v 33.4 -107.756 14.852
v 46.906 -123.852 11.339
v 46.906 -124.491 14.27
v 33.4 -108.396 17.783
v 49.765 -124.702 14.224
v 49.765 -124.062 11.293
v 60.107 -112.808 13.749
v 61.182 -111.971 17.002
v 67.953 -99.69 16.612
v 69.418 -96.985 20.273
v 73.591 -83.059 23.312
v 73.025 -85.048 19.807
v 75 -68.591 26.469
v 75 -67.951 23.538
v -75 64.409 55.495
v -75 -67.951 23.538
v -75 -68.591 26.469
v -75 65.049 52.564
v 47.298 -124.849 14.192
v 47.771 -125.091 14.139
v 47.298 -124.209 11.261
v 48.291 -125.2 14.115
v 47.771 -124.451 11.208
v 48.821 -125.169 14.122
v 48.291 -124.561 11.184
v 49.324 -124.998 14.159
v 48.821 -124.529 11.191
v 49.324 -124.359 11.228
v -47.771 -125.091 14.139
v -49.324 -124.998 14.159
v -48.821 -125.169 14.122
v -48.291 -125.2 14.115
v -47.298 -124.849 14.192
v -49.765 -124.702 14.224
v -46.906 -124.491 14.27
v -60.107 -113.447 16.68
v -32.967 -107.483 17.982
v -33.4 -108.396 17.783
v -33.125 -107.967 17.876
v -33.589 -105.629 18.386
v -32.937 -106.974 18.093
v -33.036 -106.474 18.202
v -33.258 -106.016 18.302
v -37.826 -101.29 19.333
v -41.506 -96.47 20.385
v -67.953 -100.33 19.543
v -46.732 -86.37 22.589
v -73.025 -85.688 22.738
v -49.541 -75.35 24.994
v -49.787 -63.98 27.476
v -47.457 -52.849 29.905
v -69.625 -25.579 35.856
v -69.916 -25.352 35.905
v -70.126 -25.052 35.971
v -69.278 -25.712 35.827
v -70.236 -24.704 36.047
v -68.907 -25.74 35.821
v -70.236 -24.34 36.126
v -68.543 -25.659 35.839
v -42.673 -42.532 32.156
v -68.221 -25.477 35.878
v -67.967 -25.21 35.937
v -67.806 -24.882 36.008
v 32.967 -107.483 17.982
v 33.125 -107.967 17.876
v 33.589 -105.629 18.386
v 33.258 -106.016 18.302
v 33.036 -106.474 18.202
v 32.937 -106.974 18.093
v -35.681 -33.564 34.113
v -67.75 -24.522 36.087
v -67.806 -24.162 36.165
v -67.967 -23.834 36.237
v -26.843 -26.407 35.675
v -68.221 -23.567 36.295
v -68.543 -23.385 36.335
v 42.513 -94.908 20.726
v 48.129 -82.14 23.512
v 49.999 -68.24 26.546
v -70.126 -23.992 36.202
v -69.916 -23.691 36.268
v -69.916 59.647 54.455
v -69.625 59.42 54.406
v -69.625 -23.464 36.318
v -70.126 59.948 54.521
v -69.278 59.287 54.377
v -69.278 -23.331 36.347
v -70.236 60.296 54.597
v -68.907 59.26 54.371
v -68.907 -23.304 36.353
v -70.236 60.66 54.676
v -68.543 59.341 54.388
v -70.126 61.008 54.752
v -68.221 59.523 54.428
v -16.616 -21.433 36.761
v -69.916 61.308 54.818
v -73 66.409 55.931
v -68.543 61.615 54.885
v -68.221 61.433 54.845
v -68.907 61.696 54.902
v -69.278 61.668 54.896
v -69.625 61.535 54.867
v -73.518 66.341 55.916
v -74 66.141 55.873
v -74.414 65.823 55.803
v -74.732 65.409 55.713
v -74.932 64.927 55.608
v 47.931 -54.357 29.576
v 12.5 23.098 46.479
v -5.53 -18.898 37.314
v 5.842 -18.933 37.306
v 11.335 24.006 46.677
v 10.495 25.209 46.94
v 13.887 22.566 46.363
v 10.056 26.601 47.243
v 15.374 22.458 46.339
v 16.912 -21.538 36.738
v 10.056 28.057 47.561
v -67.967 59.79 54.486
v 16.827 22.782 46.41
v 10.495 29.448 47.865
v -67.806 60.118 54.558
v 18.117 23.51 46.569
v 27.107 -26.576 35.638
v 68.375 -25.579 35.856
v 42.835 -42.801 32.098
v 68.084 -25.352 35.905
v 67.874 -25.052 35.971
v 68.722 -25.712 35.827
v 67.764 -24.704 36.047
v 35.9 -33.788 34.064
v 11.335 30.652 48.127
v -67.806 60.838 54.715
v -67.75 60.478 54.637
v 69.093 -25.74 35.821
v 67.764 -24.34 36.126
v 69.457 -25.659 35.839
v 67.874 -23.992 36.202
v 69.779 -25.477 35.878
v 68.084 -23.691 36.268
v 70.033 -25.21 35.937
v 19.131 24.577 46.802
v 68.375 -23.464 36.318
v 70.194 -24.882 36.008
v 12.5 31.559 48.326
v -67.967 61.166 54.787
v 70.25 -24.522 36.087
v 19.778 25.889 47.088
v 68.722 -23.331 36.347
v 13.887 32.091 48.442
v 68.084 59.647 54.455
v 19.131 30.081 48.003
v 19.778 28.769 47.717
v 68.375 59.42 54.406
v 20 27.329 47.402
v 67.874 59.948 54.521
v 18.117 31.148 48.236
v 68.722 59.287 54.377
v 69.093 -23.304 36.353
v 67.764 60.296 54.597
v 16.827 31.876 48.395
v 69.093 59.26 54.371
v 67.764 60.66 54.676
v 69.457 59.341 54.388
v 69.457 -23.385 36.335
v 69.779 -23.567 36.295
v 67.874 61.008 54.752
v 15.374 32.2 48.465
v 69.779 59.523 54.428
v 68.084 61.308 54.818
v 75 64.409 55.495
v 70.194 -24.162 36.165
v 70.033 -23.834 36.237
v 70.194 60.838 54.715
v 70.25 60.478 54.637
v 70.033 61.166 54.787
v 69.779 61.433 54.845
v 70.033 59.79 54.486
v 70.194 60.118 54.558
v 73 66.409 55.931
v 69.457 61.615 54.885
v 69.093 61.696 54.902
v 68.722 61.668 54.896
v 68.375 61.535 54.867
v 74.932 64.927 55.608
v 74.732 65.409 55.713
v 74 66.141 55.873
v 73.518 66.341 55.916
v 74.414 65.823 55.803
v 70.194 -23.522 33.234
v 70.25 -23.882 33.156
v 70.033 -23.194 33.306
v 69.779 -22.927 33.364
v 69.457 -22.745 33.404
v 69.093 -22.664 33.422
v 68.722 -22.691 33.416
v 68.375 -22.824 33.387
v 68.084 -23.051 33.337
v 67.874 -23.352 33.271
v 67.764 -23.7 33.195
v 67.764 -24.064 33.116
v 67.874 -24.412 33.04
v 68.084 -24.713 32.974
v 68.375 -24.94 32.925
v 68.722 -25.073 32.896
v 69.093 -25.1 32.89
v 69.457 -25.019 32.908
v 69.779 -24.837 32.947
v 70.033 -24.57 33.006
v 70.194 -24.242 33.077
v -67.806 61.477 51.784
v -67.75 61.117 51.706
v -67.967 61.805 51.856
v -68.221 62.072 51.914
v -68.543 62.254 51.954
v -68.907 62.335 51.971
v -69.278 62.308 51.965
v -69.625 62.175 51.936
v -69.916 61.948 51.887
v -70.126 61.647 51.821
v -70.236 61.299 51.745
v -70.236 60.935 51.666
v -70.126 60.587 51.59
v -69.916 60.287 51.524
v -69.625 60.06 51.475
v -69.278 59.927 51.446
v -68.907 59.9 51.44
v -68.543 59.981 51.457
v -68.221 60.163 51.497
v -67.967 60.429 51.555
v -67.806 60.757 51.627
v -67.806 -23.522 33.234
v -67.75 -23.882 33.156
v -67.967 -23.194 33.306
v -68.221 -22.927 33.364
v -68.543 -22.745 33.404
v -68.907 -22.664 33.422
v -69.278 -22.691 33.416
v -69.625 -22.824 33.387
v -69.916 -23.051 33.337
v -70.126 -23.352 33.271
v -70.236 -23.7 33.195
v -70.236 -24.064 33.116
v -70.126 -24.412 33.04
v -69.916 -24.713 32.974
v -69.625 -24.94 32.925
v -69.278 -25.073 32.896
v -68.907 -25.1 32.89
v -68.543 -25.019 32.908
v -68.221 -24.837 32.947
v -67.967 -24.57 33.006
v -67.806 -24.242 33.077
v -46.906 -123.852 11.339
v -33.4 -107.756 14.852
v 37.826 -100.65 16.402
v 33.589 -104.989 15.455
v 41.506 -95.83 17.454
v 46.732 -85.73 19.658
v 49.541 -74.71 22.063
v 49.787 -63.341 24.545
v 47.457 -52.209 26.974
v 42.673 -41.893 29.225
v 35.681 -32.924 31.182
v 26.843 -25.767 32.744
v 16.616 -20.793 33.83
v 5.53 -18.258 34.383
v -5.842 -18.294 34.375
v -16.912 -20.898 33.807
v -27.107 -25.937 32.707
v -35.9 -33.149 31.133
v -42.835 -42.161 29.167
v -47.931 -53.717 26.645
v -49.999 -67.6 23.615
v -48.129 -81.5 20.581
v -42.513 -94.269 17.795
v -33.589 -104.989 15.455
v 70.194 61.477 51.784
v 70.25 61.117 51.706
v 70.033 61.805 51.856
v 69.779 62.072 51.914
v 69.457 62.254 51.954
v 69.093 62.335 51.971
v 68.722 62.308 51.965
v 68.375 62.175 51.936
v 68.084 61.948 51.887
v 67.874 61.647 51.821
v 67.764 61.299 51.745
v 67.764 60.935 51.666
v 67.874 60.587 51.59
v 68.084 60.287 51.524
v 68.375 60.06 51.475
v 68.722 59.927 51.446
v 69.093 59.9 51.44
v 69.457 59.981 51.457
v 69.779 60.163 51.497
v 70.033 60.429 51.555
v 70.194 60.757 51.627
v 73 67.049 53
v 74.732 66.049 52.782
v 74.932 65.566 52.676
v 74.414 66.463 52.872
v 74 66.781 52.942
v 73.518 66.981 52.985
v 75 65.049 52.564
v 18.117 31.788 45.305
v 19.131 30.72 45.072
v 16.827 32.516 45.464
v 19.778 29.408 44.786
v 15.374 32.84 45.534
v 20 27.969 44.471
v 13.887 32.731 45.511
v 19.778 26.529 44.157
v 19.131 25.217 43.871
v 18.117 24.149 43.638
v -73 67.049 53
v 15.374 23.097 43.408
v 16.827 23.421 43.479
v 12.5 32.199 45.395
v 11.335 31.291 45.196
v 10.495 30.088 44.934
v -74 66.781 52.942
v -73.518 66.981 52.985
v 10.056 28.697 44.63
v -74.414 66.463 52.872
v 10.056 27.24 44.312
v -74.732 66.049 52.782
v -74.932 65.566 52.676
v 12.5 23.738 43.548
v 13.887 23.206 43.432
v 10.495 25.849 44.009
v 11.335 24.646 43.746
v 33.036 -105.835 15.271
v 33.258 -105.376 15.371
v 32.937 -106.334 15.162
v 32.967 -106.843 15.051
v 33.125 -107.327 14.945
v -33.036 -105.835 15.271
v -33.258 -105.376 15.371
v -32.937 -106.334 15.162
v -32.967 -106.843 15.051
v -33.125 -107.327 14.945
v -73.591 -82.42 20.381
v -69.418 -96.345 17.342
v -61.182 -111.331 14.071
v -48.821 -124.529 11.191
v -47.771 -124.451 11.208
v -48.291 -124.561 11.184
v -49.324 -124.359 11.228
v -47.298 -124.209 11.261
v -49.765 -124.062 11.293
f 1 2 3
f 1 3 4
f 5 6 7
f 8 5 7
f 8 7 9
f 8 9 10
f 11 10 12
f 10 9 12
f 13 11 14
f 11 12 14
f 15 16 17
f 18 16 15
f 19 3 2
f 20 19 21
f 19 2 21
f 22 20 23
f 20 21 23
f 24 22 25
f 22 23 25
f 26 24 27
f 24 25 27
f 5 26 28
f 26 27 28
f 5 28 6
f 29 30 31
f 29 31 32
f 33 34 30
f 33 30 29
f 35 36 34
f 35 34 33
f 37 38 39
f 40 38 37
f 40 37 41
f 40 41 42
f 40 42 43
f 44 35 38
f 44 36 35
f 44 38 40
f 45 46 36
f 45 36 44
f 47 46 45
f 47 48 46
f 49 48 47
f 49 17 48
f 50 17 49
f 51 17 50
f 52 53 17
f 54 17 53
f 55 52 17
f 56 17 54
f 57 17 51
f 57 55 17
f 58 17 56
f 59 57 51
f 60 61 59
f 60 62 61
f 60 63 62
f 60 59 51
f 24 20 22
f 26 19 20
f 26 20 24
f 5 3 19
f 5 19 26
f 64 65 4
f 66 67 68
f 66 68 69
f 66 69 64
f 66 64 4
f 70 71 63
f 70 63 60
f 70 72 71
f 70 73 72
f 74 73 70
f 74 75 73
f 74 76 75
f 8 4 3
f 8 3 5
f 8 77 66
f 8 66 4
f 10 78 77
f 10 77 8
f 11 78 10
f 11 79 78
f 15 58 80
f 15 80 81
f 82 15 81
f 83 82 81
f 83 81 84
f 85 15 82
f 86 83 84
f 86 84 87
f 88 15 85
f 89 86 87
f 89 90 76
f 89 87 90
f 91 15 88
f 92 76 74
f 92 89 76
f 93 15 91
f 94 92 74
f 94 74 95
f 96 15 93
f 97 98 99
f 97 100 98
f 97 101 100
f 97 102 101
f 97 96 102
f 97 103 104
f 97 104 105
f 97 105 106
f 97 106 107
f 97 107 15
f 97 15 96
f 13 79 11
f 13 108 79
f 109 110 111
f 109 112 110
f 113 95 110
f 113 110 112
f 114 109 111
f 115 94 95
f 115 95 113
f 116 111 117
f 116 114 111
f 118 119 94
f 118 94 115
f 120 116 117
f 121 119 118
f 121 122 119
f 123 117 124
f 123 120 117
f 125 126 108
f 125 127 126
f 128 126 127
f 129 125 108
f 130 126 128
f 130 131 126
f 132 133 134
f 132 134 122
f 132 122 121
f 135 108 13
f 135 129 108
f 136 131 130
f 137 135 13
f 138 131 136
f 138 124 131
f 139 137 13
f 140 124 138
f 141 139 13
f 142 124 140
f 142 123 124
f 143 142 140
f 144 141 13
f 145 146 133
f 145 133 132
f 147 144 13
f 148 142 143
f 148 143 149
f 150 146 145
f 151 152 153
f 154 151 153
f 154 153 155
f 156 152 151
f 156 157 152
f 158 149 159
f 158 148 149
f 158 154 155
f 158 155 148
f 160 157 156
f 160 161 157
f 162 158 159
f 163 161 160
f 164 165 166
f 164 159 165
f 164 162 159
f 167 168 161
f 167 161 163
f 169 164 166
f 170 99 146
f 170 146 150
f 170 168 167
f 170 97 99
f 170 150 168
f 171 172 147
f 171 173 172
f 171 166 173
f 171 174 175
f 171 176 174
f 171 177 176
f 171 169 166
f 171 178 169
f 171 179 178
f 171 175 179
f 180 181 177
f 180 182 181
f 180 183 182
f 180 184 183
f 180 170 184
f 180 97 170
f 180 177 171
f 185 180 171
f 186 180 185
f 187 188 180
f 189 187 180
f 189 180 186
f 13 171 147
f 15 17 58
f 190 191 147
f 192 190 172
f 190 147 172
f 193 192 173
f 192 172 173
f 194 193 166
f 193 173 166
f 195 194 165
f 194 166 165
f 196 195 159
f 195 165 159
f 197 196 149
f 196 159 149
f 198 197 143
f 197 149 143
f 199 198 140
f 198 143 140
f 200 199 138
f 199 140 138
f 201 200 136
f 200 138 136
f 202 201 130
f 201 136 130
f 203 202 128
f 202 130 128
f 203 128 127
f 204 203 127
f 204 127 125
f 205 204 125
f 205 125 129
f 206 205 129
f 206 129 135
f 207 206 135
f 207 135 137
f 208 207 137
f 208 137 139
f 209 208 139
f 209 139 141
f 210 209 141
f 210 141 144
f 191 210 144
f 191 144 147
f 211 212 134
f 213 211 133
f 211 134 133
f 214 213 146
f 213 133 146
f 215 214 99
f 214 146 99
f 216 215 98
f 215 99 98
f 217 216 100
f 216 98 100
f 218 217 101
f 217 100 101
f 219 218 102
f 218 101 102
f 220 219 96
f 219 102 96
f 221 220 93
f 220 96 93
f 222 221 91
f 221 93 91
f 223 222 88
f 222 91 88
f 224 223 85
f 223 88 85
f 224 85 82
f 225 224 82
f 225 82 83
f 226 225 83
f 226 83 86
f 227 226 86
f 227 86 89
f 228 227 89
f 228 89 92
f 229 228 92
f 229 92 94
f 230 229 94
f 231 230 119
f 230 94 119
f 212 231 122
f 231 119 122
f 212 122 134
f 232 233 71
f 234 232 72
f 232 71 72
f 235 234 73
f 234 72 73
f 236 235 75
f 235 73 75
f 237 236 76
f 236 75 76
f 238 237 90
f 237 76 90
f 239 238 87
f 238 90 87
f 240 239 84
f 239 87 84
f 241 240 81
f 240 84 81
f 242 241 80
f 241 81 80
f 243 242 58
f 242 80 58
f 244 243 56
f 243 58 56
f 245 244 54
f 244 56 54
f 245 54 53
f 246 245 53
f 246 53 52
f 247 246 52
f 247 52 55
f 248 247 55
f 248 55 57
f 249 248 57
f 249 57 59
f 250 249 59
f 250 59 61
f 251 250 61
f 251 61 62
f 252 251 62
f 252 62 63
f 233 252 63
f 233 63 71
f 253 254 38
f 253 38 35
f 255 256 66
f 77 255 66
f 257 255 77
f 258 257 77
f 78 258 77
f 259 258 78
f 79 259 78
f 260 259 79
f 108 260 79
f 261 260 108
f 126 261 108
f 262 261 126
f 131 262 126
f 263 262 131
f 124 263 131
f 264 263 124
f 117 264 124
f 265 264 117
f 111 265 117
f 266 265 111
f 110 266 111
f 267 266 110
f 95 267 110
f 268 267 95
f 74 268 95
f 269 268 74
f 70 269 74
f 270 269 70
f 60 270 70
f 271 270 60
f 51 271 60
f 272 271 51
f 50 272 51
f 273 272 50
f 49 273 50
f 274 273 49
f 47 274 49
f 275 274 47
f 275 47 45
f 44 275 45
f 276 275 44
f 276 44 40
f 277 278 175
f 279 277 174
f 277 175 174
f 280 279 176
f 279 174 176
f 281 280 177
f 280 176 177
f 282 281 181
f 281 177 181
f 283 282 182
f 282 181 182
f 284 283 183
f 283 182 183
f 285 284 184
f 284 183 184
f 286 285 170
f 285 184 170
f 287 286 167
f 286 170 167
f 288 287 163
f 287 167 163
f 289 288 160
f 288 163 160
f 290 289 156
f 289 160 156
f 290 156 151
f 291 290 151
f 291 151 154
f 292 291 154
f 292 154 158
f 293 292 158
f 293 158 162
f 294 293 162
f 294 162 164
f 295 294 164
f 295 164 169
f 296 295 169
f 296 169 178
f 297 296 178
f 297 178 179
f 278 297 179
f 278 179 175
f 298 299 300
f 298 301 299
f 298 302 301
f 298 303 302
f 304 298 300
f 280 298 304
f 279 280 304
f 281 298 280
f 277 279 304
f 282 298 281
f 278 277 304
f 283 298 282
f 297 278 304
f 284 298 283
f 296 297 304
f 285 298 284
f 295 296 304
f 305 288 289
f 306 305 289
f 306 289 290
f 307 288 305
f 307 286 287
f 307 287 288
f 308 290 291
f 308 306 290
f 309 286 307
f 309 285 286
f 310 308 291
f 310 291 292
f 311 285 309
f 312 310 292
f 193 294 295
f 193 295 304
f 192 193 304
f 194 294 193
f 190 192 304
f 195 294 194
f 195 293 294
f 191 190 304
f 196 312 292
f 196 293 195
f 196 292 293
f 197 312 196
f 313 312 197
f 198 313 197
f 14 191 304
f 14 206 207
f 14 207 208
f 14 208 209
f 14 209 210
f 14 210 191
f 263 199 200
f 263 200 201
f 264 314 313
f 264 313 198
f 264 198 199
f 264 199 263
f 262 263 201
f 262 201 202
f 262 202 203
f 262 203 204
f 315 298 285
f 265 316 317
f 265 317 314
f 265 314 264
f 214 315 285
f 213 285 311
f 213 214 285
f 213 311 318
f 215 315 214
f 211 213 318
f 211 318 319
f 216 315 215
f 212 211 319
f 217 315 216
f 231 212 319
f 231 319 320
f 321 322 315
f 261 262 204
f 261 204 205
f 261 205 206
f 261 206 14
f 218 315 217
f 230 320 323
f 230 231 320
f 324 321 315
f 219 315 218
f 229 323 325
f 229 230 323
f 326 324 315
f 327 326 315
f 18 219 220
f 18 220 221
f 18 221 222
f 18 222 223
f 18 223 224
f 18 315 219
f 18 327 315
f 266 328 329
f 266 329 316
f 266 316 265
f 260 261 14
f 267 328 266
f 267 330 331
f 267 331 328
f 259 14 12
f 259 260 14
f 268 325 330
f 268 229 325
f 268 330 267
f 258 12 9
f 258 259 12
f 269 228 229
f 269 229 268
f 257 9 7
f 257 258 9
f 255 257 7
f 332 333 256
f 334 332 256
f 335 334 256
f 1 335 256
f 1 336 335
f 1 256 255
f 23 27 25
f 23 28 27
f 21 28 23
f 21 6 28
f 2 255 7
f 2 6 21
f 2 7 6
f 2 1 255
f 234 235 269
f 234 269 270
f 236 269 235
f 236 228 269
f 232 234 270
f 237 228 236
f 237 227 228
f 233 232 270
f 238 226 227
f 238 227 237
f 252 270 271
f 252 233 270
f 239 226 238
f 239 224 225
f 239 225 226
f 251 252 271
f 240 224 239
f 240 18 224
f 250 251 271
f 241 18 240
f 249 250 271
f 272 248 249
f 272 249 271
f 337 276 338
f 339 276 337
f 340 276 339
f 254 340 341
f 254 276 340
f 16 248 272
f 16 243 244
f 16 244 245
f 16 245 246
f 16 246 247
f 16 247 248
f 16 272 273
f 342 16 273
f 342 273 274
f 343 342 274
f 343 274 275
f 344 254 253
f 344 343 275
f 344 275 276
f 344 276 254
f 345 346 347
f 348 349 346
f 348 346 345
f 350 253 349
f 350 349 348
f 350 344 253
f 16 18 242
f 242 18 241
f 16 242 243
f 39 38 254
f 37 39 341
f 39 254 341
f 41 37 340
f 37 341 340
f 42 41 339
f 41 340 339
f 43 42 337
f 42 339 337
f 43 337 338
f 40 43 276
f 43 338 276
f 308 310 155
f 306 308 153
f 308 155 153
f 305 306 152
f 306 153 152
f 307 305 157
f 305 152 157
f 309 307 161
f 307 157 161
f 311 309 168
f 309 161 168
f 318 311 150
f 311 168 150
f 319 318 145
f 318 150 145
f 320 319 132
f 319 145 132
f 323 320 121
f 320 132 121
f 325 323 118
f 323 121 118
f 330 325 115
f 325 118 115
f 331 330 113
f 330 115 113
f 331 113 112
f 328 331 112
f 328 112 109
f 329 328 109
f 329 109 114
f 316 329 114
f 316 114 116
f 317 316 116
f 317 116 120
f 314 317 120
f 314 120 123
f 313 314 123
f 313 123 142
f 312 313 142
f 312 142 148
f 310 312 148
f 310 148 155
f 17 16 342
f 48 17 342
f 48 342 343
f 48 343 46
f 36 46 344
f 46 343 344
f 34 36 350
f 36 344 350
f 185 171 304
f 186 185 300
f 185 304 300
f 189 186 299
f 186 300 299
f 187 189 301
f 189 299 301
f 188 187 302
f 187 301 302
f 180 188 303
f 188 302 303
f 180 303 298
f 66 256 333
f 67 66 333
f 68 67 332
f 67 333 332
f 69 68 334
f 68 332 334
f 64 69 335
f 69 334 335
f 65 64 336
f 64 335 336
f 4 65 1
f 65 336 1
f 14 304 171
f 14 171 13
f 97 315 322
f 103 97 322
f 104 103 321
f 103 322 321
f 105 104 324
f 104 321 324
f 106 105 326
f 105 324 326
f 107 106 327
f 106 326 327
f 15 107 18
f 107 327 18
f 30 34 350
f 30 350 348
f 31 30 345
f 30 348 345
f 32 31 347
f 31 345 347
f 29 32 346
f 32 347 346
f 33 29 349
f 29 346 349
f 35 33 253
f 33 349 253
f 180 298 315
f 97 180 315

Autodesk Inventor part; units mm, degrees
ref_plane "YZ Plane" through (0, 0, 0) normal (1, 0, 0) x (0, 1, 0)
ref_plane "XZ Plane" through (0, 0, 0) normal (0, 1, 0) x (-1, 0, 0)
sketch "Sketch1" plane through (0, 0, 0) normal (0, 0, 1) x (1, 0, 0)
  line L0 (-75, 67.0488) -> (75, 67.0488)
  arc A0 (-75, -67.9512) -> (-48.2091, -125.4046) centre (0, -67.9512) ccw
  arc A1 (48.2091, -125.4046) -> (75, -67.9512) centre (0, -67.9512) ccw
  arc A2 (32.1394, -106.2534) -> (-32.1394, -106.2534) centre (0, -67.9512) ccw
  line L1 (-48.2091, -125.4046) -> (-32.1394, -106.2534) construction
  line L2 (-32.1394, -106.2534) -> (0, -67.9512) construction
  line L3 (-48.2091, -125.4046) -> (-32.1394, -106.2534) construction
  line L4 (75, -67.9512) -> (75, 67.0488)
  line L5 (-75, -67.9512) -> (-75, 67.0488)
  line L6 (0, -67.9512) -> (0, -148.7803) construction
  line L7 (-32.1394, -106.2534) -> (-48.2091, -125.4046)
  line L8 (48.2091, -125.4046) -> (32.1394, -106.2534)
  point P0 (0, 0)
  dimension "d0" = 150
  dimension "d2" = 135
  dimension "d3" = 135
  dimension "d7" = 135
  dimension "d8" = 50
  dimension "d19" = 75
  dimension "d25" = 75
  dimension "d26" = 0
  dimension "d29" = 50
  dimension "d31" = 50
  dimension "d34" = 40
  dimension "d35" = 40
extrude "Extrusion1" add sketch "Sketch1" along normal blind 3
sketch "Sketch5" plane through (0, 0, 3) normal (0, 0, 1) x (1, 0, 0)
  arc A0 (32.1394, -106.2534) -> (-32.1394, -106.2534) centre (0, -67.9512) ccw projected
  line L0 (32.1394, -106.2534) -> (48.2091, -125.4046) projected
  line L1 (-48.2091, -125.4046) -> (-32.1394, -106.2534) projected
  arc A1 (37.2817, -112.3818) -> (-37.2817, -112.3818) centre (0, -67.9512) ccw
  arc A2 (32.1394, -106.2534) -> (-32.1394, -106.2534) centre (0, -67.9512) ccw projected
  arc A3 (32.1394, -106.2534) -> (-32.1394, -106.2534) centre (0, -67.9512) ccw
  arc A4 (41.7812, -117.7441) -> (-41.7812, -117.7441) centre (0, -67.9512) ccw
  arc A5 (46.2807, -123.1064) -> (-46.2807, -123.1064) centre (0, -67.9512) ccw
  line L2 (-46.2807, -123.1064) -> (-41.7812, -117.7441)
  line L3 (-37.2817, -112.3818) -> (-32.1394, -106.2534)
  line L4 (32.1394, -106.2534) -> (37.2817, -112.3818)
  line L5 (41.7812, -117.7441) -> (46.2807, -123.1064)
  point P0 (0, 0)
  dimension "d49" = 58
  dimension "d52" = 65
  dimension "d53" = 72
extrude "Extrusion3" add sketch "Sketch5" along normal blind 8 contours A0 L1 A1 L0 | A4 L1 A5 L0
sketch "Sketch7" plane through (-48.2091, -125.4046, 3) normal (0.7660444, -0.6427876, 0) x (0, 0, -1)
  line L0 (0, 10) -> (-8, 10) projected
  line L1 (-4.5, 10) -> (0, 10)
  line L2 (0, 10) -> (0, 17) projected
  line L3 (0, 10) -> (0, 17)
  line L4 (0, 17) -> (-4.5, 17)
  line L5 (0, 17) -> (-8, 17) projected
  arc A0 (-4.5, 10) -> (-4.5, 17) centre (-4.5, 13.5) ccw
  line L6 (-19.076, 75) -> (19.2246, 75) construction
  point P0 (3, 127.0537)
  dimension "d58" = 4.5
  dimension "d59" = 0
  dimension "d60" = 0
  dimension "d61" = 3.5
  dimension "d62" = 58
revolve "Revolution1" add sketch "Sketch7" angle 280 about axis through (0, -67.9512, 22.076) along (0, 0, -1)
sketch "Sketch18" plane through (0, 0, 0) normal (0, 0, -1) x (-1, 0, 0)
  arc A0 (32.1394, -106.2534) -> (-32.1394, -106.2534) centre (0, -67.9512) ccw projected
  line L0 (32.1394, -106.2534) -> (48.2091, -125.4046) projected
  arc A1 (32.1394, -106.2534) -> (-32.1394, -106.2534) centre (0, -67.9512) ccw
  line L1 (-32.1394, -106.2534) -> (-47.5756, -125.4046)
  line L2 (32.1394, -106.2534) -> (48.2091, -125.4046)
  line L3 (75, 67.0488) -> (-75, 67.0488) projected
  line L4 (-75, 67.0488) -> (-75, -67.9512) projected
  arc A2 (-75, -67.9512) -> (-48.2091, -125.4046) centre (0, -67.9512) ccw projected
  line L5 (-48.2091, -125.4046) -> (-32.1394, -106.2534) projected
  arc A3 (32.1394, -106.2534) -> (-32.1394, -106.2534) centre (0, -67.9512) ccw projected
  line L6 (32.1394, -106.2534) -> (48.2091, -125.4046) projected
  arc A4 (48.2091, -125.4046) -> (75, -67.9512) centre (0, -67.9512) ccw projected
  line L7 (75, -67.9512) -> (75, 67.0488) projected
  arc A5 (-75, -67.9512) -> (-48.2091, -125.4046) centre (0, -67.9512) ccw projected
  line L8 (-75, -67.9512) -> (-75, 67.0488)
  line L9 (75, -67.9512) -> (75, 67.0488) projected
  line L10 (75, 67.0488) -> (75, -67.9512)
  arc A6 (-75, -67.9512) -> (-48.2091, -125.4046) centre (0, -67.9512) ccw
  arc A7 (48.2091, -125.4046) -> (75, -67.9512) centre (0, -67.9512) ccw projected
  arc A8 (48.2091, -125.4046) -> (75, -67.9512) centre (0, -67.9512) ccw
  arc A9 (35.4639, -107.3379) -> (-35.4639, -107.3379) centre (0, -67.9512) ccw
  line L11 (0, -67.9512) -> (35.4639, -107.3379) construction
  line L12 (0, -67.9512) -> (-35.4639, -107.3379) construction
  line L13 (0, -67.9512) -> (0, -163.7516) construction
  arc A10 (46.2807, -123.1064) -> (-46.2807, -123.1064) centre (0, -67.9512) ccw construction
  line L14 (72, -67.9512) -> (72, 64.0488)
  line L15 (72, 64.0488) -> (-72, 64.0488)
  line L16 (-72, 64.0488) -> (-72, -67.9512)
  arc A11 (-72, -67.9512) -> (-48.1774, -121.4576) centre (0, -67.9512) ccw
  arc A12 (48.1774, -121.4576) -> (72, -67.9512) centre (0, -67.9512) ccw
  line L17 (-48.1774, -121.4576) -> (-35.4639, -107.3379)
  line L18 (35.4639, -107.3379) -> (48.1774, -121.4576)
  point P0 (0, 0)
  dimension "d99" = 84
  dimension "d100" = 42
  dimension "d101" = 53
  dimension "d102" = 3
  dimension "d103" = 3
extrude "Extrusion8" add sketch "Sketch18" against normal blind 53
sketch "Sketch19" plane through (75, -67.9512, 0) normal (1, 0, 0) x (0, 0, -1)
  line L0 (-3, 132) -> (-3, 0) projected
  line L1 (-3, 0) -> (-3, 0) projected
  line L2 (-3, 0) -> (-3, 132) projected
  line L3 (-11, 0) -> (-11, -53.5064) projected
  line L4 (-53, 0) -> (-53, 135) projected
  line L5 (-53, 0) -> (-53, -57.4533) projected
  line L6 (0, -57.4533) -> (-53, -57.4533) projected
  line L7 (-53, 135) -> (-53, -57.4533)
  line L8 (-53, -57.4533) -> (-11, -57.4533)
  line L9 (0, 135) -> (-53, 135) projected
  line L10 (-11, -57.4533) -> (-53, 135)
  point P0 (0, 67.9512)
  dimension "d106" = 0
extrude "Extrusion9" cut sketch "Sketch19" against normal blind 150
sketch "Sketch20" plane through (-32.1394, -106.2534, 15.1794) normal (0.7660444, -0.6427876, 0) x (0, 0, -1)
  ellipse E0 centre (7.6794, -11.4625) end of major axis (11.1794, -11.4625) minor radius 3.4979 (7.6794, -14.9604) -> (7.6794, -7.9647) ccw projected
  circle A0 centre (7.6794, -11.4625) radius 3.5
  line L0 (-25.5689, 50.0375) -> (41.9904, 50.0375) construction
  point P0 (15.1794, 102.0537)
  dimension "d109" = 61.5
revolve "Revolution4" cut sketch "Sketch20" angle 2 about axis through (0.0241, -67.9225, 40.7483) along (0, 0, -1)
mirror "Mirror3" about plane through (0, 0, 0) normal (1, 0, 0) of "Revolution4"
fillet "Fillet1" radius 2 12 edges at (75, 67.0488, 26.5) (-48.2091, -125.4046, 5.5) (-32.1394, -106.2534, 7.5897) (48.2091, -125.4046, 5.5) (32.1394, -106.2534, 7.5897) (-75, 67.0488, 26.5) (0, 67.0488, 0) (-67.9731, -99.6476, 0) (-75, -0.4512, 0) (67.9731, -99.6476, 0) (75, -0.4512, 0) (0, -17.9512, 0)
sketch "Sketch23" plane through (0, 0, 0) normal (0, 0, -1) x (-1, 0, 0)
  arc A0 (43.4935, -116.2556) -> (-43.4935, -116.2556) centre (0, -67.9512) ccw projected
  line L0 (0, -67.9512) -> (0, -128.8082) construction
  arc A1 (43.4935, -116.2556) -> (-43.4935, -116.2556) centre (0, -67.9512) ccw projected
  line L1 (-56.2917, -100.4512) -> (-50.2295, -96.9512) construction
  line L2 (0, -67.9512) -> (-50.2295, -96.9512) construction
  line L3 (-56.2917, -100.4512) -> (0, -67.9512) construction
  circle A2 centre (-55.0106, -95.6701) radius 3.5 construction
  line L4 (-59.6154, -93.8549) -> (-53.1953, -91.0653) construction
  arc A3 (38.8096, -111.0536) -> (-38.8096, -111.0536) centre (0, -67.9512) ccw construction
  arc A4 (-62.3186, -49.4745) -> (-59.6154, -93.8549) centre (0, -67.9512) ccw construction
  line L5 (0, -67.9512) -> (-62.3186, -49.4745) construction
  line L6 (0, -67.9512) -> (-59.6154, -93.8549) construction
  arc A5 (35.4639, -107.3379) -> (-35.4639, -107.3379) centre (0, -67.9512) ccw construction
  arc A6 (-55.6074, -51.4643) -> (-53.1953, -91.0653) centre (0, -67.9512) ccw construction
  line L7 (0, -67.9512) -> (-55.6074, -51.4643) construction
  line L8 (0, -67.9512) -> (-53.1953, -91.0653) construction
  line L9 (-62.3186, -49.4745) -> (-55.6074, -51.4643)
  arc A7 (-62.3186, -49.4745) -> (-56.2917, -100.4512) centre (0, -67.9512) ccw
  arc A8 (-55.6074, -51.4643) -> (-50.2295, -96.9512) centre (0, -67.9512) ccw
  line L10 (-56.2917, -100.4512) -> (-50.2295, -96.9512)
  point P0 (0, 0)
  dimension "d113" = 7
  dimension "d114" = 60
  dimension "d115" = 7
  dimension "d116" = 7
  dimension "d117" = 40
  dimension "d118" = 40
extrude "Extrusion10" cut sketch "Sketch23" against normal up to next
sketch "Sketch24" plane through (-73, 67.0488, 53) normal (0, -0.2132164, 0.977005) x (1, 0, 0)
  line L0 (146, 0) -> (0, 0) projected
  ellipse E0 centre (0, -2.0471) end of major axis (0, 0) minor radius 2 (0, 0) -> (-2, -2.0471) ccw projected
  line L1 (-2, -138.1774) -> (-2, -2.0471) projected
  ellipse E1 centre (73, -138.1774) end of major axis (73, -61.4122) minor radius 75 (-2, -138.1774) -> (23.235, -195.609) ccw projected
  ellipse E2 centre (24.562, -194.0775) end of major axis (24.562, -196.1246) minor radius 2 (23.235, -195.609) -> (26.0941, -195.3933) ccw projected
  line L2 (39.5998, -178.9191) -> (26.0941, -195.3933) projected
  ellipse E3 centre (38.0677, -177.6032) end of major axis (38.0677, -175.5562) minor radius 2 (39.5998, -178.9191) -> (39.4112, -176.0869) ccw projected
  ellipse E4 centre (73, -138.1774) end of major axis (73, -189.3542) minor radius 50 (106.5888, -176.0869) -> (39.4112, -176.0869) ccw projected
  ellipse E5 centre (107.9323, -177.6032) end of major axis (107.9323, -175.5562) minor radius 2 (106.5888, -176.0869) -> (106.4002, -178.9191) ccw projected
  line L3 (119.9059, -195.3933) -> (106.4002, -178.9191) projected
  ellipse E6 centre (121.438, -194.0775) end of major axis (121.438, -196.1246) minor radius 2 (119.9059, -195.3933) -> (122.765, -195.609) ccw projected
  ellipse E7 centre (73, -138.1774) end of major axis (73, -61.4122) minor radius 75 (122.765, -195.609) -> (148, -138.1774) ccw projected
  line L4 (148, -2.0471) -> (148, -138.1774) projected
  ellipse E8 centre (146, -2.0471) end of major axis (146, 0) minor radius 2 (148, -2.0471) -> (146, 0) ccw projected
  point P0 (73, -76.8075)
extrude "Extrusion11" add sketch "Sketch24" along normal blind 3
ref_plane "Work Plane1" through (-73, 67.0488, 53) normal (0, -0.2132164, 0.977005) x (1, 0, 0)
split "Split1" plane through (-73, 67.0488, 53) removes the side toward (0, 0.2132164, -0.977005)
sketch "Sketch25" plane through (-73, 66.4091, 55.931) normal (0, -0.2132164, 0.977005) x (1, 0, 0)
  circle A0 centre (88, -40) radius 5
  line L0 (146, 0) -> (0, 0) projected
  line L1 (148, -138.1774) -> (148, -2.0471) projected
  point P0 (73, -76.8075)
  dimension "d124" = 10
  dimension "d125" = 40
  dimension "d126" = 60
extrude "Extrusion12" cut sketch "Sketch25" against normal blind 10
sketch "Sketch26" plane through (-73, 66.4091, 55.931) normal (0, -0.2132164, 0.977005) x (1, 0, 0)
  circle A0 centre (4, -6.071) radius 1.25
  circle A1 centre (4, -93.071) radius 1.25
  circle A2 centre (142, -93.071) radius 1.25
  circle A3 centre (142, -6.071) radius 1.25
  line L0 (146, 0) -> (0, 0) projected
  line L1 (-2, -2.0471) -> (-2, -138.1774) projected
  line L2 (148, -138.1774) -> (148, -2.0471) projected
  point P0 (73, -76.8075)
  dimension "d129" = 2.5
  dimension "d130" = 2.5
  dimension "d131" = 2.5
  dimension "d132" = 2.5
  dimension "d133" = 6.071
  dimension "d134" = 6.071
  dimension "d135" = 6
  dimension "d136" = 6
  dimension "d137" = 6
  dimension "d138" = 6
  dimension "d139" = 93.071
  dimension "d140" = 93.071
extrude "Extrusion13" cut sketch "Sketch26" against normal up to next
properties part number "Lock Base"
